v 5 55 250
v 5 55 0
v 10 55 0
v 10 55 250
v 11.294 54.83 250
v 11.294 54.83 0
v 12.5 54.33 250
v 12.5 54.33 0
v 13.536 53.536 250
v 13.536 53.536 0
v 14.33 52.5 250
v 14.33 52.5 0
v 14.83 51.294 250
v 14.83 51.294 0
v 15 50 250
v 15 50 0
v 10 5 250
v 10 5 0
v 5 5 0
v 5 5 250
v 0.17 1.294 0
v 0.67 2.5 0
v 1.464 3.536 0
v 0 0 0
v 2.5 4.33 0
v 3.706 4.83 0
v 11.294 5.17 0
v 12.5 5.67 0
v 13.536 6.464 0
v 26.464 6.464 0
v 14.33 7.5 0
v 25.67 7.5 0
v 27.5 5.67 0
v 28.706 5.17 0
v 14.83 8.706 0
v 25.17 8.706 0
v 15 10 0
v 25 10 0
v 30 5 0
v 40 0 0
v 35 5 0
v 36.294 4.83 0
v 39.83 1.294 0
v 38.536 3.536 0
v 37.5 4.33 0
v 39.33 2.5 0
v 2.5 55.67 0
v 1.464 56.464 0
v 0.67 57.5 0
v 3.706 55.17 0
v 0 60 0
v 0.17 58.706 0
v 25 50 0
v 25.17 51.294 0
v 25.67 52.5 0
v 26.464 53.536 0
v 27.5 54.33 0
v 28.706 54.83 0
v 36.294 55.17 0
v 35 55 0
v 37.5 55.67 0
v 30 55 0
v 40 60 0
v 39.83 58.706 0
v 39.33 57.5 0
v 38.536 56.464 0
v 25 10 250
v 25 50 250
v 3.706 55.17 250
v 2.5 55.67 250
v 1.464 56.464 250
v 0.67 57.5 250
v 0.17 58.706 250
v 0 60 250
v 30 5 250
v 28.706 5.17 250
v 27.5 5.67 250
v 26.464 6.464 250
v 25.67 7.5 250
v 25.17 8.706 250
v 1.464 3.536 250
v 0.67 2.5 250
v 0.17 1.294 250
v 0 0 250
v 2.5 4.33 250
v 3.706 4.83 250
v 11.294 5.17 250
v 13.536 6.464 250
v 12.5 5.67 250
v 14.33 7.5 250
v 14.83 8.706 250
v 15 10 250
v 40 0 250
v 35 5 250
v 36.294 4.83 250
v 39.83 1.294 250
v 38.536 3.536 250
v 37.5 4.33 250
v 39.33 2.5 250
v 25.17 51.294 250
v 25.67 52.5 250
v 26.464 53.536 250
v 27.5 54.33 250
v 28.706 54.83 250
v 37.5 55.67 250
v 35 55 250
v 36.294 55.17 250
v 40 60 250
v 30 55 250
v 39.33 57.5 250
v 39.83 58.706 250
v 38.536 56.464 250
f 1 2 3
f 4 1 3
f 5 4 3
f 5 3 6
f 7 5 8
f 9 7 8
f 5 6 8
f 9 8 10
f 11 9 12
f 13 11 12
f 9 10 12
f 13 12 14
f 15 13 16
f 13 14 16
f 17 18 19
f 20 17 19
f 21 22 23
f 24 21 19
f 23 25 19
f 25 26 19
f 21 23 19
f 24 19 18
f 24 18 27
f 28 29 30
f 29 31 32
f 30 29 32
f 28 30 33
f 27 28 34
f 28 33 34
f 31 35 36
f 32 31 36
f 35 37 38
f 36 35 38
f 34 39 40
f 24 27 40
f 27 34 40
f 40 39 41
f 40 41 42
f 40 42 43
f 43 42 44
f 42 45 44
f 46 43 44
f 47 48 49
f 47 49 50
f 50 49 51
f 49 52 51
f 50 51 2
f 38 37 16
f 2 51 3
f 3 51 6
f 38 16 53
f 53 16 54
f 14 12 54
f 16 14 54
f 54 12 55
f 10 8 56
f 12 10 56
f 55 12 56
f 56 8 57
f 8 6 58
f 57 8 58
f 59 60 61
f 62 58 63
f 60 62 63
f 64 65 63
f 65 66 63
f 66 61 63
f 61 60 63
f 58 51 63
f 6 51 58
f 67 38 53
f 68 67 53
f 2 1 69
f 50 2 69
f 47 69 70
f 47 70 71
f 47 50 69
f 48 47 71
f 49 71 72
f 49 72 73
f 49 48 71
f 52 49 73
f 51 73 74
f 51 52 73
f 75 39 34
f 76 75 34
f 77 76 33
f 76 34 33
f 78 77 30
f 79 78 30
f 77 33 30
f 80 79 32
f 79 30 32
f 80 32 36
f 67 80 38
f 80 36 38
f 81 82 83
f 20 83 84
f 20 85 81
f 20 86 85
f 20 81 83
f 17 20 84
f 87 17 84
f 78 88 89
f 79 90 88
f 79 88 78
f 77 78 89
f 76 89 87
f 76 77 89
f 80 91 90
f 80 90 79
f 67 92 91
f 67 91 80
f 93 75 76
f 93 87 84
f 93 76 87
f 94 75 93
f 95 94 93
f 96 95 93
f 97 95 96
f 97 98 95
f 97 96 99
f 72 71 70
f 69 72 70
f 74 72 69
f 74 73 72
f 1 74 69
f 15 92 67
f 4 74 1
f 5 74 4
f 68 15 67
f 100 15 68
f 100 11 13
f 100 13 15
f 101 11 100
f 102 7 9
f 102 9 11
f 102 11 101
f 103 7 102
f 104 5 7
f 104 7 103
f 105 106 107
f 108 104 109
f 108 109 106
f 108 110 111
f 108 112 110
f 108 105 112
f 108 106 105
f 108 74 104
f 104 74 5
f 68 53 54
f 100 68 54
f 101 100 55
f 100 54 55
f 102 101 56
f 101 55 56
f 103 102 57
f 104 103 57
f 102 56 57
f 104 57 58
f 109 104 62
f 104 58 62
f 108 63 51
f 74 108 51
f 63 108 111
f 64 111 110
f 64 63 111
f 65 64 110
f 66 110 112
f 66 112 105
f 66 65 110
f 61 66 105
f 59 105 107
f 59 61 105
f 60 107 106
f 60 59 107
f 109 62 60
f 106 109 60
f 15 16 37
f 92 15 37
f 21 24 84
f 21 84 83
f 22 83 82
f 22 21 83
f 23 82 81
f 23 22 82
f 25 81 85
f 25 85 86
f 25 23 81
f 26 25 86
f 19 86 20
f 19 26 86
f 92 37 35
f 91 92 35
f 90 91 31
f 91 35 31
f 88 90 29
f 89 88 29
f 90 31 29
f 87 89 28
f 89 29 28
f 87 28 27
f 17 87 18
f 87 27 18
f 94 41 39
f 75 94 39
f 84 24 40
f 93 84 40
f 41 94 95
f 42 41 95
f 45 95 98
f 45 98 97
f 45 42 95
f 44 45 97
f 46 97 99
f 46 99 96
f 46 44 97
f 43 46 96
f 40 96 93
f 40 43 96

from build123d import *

# Parameters (mm, degrees)
DODANIE_WYCI_GNI_CIE1_DEPTH = 250
ZAOKR_GLENIE2_DEPTH         = 250
ZAOKR_GLENIE2_2_DEPTH       = 250


with BuildPart() as part:
    # Szkic1 → Dodanie-wyciągnięcie1 (new body)
    with BuildSketch(Plane.XY):
        Polygon((0, 0), (40, 0), (40, 5), (25, 5), (25, 55), (40, 55), (40, 60), (0, 60), (0, 55), (15, 55), (15, 5), (0, 5), align=None)
    extrude(amount=DODANIE_WYCI_GNI_CIE1_DEPTH)

    # Zaokrąglenie2: read off the stored shape, not the designer's step
    # Zaokrąglenie2 outline → Zaokrąglenie2 (cut)
    with BuildSketch(Plane.XY):
        with BuildLine():
            Line((40, 55), (40, 60))
            ThreePointArc((40, 60), (38.535533906, 56.464466094), (35, 55))
            Line((35, 55), (40, 55))
        make_face()
        with BuildLine():
            Line((40, 5), (35, 5))
            ThreePointArc((35, 5), (38.535533906, 3.535533906), (40, 0))
            Line((40, 0), (40, 5))
        make_face()
        with BuildLine():
            Line((0, 55), (5, 55))
            ThreePointArc((5, 55), (1.464466094, 56.464466094), (0, 60))
            Line((0, 60), (0, 55))
        make_face()
        with BuildLine():
            ThreePointArc((0, 0), (1.464466094, 3.535533906), (5, 5))
            Line((5, 5), (0, 5))
            Line((0, 5), (0, 0))
        make_face()
    extrude(amount=ZAOKR_GLENIE2_DEPTH, mode=Mode.SUBTRACT)

    # Zaokr_glenie2 2 outline → Zaokr_glenie2 2 (add)
    with BuildSketch(Plane.XY):
        with BuildLine():
            ThreePointArc((30, 5), (26.464466094, 6.464466094), (25, 10))
            Line((25, 10), (25, 5))
            Line((25, 5), (30, 5))
        make_face()
        with BuildLine():
            ThreePointArc((25, 50), (26.464466094, 53.535533906), (30, 55))
            Line((30, 55), (25, 55))
            Line((25, 55), (25, 50))
        make_face()
        with BuildLine():
            ThreePointArc((10, 55), (13.535533906, 53.535533906), (15, 50))
            Line((15, 50), (15, 55))
            Line((15, 55), (10, 55))
        make_face()
        with BuildLine():
            ThreePointArc((15, 10), (13.535533906, 6.464466094), (10, 5))
            Line((10, 5), (15, 5))
            Line((15, 5), (15, 10))
        make_face()
    extrude(amount=ZAOKR_GLENIE2_2_DEPTH)


solid = part.part
